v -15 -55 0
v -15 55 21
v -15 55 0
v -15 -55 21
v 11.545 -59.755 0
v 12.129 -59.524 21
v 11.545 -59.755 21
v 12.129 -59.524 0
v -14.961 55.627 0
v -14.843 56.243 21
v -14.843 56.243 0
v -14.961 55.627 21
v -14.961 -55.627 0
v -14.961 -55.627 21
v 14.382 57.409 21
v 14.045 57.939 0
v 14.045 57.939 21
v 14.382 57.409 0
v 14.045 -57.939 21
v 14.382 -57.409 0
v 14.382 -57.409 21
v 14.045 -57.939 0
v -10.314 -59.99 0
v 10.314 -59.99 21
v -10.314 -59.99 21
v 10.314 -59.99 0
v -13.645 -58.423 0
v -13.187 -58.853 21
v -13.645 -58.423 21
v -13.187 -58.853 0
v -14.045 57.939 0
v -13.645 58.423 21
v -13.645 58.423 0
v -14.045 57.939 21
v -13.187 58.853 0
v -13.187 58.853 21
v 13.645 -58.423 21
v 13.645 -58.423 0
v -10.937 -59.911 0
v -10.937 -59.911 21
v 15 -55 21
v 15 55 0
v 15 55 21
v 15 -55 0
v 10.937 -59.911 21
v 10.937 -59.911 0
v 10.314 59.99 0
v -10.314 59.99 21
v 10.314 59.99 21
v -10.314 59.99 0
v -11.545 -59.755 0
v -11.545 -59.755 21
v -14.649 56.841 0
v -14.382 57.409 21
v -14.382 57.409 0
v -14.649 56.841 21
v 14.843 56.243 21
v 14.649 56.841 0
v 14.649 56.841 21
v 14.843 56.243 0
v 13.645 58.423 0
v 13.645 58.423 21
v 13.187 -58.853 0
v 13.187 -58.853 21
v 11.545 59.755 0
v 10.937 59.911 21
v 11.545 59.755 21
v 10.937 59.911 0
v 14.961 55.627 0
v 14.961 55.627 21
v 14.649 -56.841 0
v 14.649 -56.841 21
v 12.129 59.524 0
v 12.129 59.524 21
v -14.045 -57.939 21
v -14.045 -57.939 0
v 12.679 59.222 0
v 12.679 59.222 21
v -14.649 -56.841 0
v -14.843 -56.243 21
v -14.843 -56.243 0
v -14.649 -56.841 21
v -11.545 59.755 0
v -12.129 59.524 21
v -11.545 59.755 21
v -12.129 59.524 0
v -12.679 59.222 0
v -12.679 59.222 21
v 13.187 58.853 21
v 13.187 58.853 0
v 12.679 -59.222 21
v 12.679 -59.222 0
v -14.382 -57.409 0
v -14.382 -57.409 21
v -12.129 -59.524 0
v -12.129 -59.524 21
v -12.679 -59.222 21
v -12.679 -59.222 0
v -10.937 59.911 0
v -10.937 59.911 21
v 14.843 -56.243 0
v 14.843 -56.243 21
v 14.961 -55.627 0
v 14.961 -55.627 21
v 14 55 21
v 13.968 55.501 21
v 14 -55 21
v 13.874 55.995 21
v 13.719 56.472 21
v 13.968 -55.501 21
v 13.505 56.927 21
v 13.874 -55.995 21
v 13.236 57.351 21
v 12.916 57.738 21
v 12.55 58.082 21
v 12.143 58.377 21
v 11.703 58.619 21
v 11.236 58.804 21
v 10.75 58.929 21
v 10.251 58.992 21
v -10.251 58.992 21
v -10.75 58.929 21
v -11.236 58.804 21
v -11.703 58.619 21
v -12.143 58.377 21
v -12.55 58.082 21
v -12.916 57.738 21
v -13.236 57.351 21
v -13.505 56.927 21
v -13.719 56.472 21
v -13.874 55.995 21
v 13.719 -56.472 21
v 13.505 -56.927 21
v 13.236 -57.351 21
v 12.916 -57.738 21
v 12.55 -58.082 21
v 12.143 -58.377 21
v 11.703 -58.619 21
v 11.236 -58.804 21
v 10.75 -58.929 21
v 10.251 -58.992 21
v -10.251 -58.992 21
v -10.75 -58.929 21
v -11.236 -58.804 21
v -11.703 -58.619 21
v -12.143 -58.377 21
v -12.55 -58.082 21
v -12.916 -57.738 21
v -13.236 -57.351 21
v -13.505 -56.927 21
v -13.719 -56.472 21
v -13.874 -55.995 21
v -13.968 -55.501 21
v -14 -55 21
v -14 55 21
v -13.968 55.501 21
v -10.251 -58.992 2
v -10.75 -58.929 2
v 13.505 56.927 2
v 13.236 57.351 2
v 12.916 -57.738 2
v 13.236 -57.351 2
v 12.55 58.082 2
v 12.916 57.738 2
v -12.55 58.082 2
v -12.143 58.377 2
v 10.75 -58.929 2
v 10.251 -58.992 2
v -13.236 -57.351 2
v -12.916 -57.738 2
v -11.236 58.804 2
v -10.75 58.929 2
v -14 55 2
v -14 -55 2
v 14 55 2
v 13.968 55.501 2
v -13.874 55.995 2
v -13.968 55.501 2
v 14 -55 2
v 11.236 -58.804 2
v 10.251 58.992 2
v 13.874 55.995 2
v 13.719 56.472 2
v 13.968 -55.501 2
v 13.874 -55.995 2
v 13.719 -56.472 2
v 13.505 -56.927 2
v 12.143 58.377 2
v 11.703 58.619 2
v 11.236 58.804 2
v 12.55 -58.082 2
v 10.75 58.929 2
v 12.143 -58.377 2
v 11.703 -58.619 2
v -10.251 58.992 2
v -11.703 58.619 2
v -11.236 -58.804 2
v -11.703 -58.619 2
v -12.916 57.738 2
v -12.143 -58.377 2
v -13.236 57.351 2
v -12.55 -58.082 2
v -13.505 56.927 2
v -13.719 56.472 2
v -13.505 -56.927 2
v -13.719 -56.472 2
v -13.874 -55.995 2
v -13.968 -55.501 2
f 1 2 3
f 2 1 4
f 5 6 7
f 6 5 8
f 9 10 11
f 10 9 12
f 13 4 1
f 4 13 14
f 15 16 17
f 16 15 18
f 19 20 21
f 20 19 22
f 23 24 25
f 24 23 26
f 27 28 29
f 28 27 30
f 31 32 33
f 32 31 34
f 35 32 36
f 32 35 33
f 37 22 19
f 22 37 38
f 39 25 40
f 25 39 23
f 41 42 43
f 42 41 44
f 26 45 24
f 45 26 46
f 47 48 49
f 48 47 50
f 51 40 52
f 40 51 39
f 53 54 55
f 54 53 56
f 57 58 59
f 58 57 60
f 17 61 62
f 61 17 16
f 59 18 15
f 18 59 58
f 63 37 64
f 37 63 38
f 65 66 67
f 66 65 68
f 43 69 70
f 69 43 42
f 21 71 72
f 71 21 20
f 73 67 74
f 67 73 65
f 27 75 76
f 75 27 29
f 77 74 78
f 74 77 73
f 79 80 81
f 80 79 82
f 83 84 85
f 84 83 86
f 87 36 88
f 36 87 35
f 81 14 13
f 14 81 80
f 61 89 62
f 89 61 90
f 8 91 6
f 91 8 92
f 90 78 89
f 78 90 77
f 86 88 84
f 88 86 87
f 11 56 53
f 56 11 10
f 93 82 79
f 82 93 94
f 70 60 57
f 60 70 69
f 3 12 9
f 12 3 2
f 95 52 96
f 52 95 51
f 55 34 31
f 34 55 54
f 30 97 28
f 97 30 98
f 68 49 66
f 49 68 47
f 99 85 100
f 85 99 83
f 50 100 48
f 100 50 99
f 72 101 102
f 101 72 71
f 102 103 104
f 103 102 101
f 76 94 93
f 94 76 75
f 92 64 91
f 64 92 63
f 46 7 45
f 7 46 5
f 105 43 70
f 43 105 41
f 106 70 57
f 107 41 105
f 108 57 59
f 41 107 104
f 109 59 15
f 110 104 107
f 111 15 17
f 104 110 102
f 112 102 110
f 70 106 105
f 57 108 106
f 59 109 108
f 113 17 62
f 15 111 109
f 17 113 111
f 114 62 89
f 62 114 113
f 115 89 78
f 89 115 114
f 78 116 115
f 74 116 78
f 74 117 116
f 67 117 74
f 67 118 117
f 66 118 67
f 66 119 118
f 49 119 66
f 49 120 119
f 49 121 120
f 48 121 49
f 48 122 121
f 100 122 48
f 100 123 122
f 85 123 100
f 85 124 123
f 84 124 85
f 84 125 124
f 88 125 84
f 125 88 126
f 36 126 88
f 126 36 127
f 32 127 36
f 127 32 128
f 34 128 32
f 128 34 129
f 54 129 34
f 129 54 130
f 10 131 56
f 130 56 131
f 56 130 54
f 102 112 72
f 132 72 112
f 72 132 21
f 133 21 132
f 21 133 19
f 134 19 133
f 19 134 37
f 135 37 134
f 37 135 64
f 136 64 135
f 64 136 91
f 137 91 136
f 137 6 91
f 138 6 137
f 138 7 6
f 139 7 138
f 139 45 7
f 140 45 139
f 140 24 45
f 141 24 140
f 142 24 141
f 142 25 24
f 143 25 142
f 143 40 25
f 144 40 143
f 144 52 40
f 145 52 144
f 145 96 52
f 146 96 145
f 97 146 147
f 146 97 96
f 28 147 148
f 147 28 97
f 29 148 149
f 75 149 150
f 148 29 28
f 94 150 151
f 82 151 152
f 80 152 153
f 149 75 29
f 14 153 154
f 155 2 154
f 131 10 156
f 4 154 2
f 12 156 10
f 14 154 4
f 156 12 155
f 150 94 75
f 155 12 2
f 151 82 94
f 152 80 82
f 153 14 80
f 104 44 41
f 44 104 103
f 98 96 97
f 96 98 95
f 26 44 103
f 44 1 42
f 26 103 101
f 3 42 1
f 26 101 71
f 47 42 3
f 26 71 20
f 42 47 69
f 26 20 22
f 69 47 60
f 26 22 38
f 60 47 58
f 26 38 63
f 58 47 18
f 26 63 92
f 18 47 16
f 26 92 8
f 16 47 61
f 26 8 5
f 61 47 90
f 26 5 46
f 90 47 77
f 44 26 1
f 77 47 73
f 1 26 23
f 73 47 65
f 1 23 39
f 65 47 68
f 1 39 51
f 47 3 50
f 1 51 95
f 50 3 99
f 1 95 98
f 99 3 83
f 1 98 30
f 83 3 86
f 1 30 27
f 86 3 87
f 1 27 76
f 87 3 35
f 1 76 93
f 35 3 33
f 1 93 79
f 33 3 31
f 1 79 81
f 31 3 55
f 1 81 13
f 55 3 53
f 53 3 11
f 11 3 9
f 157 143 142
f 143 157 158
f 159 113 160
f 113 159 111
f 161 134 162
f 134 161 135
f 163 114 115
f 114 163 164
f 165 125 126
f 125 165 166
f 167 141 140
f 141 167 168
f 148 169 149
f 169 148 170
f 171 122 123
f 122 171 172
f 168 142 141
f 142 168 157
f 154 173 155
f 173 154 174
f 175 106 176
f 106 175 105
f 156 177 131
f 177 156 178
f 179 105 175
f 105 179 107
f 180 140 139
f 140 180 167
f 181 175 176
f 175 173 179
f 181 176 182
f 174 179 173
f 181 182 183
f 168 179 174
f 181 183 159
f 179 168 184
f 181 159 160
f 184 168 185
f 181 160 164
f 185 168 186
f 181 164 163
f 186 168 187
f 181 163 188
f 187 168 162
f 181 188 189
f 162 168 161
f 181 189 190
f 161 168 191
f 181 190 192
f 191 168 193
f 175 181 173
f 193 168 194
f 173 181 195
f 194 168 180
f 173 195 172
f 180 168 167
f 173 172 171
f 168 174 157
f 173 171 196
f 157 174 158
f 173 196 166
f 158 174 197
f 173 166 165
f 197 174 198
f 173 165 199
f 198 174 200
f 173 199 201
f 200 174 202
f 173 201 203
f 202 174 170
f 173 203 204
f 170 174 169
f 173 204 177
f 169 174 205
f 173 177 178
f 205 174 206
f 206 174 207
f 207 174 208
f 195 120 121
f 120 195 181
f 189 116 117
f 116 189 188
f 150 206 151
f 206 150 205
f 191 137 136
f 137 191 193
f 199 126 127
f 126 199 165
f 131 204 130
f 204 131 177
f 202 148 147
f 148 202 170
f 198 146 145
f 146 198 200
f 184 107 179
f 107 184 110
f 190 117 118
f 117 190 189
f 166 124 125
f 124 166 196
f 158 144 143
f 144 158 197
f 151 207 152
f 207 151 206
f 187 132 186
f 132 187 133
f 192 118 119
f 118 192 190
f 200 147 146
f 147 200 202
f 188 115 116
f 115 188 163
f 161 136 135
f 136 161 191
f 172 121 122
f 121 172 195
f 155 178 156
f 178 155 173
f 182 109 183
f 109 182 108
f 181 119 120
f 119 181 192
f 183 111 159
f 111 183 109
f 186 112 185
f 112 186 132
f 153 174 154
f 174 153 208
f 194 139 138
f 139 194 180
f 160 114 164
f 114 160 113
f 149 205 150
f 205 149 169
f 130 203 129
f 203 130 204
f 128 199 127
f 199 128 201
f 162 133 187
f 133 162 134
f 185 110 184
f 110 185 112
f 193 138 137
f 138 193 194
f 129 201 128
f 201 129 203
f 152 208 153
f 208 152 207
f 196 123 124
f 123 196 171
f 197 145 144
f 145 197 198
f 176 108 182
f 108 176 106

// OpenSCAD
$fn = 50;


difference() {
	union() {
		hull() {
			translate(v = [-10.0000000000, 55.0000000000, 0]) {
				cylinder(h = 21, r = 5);
			}
			translate(v = [10.0000000000, 55.0000000000, 0]) {
				cylinder(h = 21, r = 5);
			}
			translate(v = [-10.0000000000, -55.0000000000, 0]) {
				cylinder(h = 21, r = 5);
			}
			translate(v = [10.0000000000, -55.0000000000, 0]) {
				cylinder(h = 21, r = 5);
			}
		}
	}
	union() {
		translate(v = [0, 0, 2]) {
			hull() {
				translate(v = [-10.0000000000, 55.0000000000, 0]) {
					cylinder(h = 19, r = 4);
				}
				translate(v = [10.0000000000, 55.0000000000, 0]) {
					cylinder(h = 19, r = 4);
				}
				translate(v = [-10.0000000000, -55.0000000000, 0]) {
					cylinder(h = 19, r = 4);
				}
				translate(v = [10.0000000000, -55.0000000000, 0]) {
					cylinder(h = 19, r = 4);
				}
			}
		}
	}
}
